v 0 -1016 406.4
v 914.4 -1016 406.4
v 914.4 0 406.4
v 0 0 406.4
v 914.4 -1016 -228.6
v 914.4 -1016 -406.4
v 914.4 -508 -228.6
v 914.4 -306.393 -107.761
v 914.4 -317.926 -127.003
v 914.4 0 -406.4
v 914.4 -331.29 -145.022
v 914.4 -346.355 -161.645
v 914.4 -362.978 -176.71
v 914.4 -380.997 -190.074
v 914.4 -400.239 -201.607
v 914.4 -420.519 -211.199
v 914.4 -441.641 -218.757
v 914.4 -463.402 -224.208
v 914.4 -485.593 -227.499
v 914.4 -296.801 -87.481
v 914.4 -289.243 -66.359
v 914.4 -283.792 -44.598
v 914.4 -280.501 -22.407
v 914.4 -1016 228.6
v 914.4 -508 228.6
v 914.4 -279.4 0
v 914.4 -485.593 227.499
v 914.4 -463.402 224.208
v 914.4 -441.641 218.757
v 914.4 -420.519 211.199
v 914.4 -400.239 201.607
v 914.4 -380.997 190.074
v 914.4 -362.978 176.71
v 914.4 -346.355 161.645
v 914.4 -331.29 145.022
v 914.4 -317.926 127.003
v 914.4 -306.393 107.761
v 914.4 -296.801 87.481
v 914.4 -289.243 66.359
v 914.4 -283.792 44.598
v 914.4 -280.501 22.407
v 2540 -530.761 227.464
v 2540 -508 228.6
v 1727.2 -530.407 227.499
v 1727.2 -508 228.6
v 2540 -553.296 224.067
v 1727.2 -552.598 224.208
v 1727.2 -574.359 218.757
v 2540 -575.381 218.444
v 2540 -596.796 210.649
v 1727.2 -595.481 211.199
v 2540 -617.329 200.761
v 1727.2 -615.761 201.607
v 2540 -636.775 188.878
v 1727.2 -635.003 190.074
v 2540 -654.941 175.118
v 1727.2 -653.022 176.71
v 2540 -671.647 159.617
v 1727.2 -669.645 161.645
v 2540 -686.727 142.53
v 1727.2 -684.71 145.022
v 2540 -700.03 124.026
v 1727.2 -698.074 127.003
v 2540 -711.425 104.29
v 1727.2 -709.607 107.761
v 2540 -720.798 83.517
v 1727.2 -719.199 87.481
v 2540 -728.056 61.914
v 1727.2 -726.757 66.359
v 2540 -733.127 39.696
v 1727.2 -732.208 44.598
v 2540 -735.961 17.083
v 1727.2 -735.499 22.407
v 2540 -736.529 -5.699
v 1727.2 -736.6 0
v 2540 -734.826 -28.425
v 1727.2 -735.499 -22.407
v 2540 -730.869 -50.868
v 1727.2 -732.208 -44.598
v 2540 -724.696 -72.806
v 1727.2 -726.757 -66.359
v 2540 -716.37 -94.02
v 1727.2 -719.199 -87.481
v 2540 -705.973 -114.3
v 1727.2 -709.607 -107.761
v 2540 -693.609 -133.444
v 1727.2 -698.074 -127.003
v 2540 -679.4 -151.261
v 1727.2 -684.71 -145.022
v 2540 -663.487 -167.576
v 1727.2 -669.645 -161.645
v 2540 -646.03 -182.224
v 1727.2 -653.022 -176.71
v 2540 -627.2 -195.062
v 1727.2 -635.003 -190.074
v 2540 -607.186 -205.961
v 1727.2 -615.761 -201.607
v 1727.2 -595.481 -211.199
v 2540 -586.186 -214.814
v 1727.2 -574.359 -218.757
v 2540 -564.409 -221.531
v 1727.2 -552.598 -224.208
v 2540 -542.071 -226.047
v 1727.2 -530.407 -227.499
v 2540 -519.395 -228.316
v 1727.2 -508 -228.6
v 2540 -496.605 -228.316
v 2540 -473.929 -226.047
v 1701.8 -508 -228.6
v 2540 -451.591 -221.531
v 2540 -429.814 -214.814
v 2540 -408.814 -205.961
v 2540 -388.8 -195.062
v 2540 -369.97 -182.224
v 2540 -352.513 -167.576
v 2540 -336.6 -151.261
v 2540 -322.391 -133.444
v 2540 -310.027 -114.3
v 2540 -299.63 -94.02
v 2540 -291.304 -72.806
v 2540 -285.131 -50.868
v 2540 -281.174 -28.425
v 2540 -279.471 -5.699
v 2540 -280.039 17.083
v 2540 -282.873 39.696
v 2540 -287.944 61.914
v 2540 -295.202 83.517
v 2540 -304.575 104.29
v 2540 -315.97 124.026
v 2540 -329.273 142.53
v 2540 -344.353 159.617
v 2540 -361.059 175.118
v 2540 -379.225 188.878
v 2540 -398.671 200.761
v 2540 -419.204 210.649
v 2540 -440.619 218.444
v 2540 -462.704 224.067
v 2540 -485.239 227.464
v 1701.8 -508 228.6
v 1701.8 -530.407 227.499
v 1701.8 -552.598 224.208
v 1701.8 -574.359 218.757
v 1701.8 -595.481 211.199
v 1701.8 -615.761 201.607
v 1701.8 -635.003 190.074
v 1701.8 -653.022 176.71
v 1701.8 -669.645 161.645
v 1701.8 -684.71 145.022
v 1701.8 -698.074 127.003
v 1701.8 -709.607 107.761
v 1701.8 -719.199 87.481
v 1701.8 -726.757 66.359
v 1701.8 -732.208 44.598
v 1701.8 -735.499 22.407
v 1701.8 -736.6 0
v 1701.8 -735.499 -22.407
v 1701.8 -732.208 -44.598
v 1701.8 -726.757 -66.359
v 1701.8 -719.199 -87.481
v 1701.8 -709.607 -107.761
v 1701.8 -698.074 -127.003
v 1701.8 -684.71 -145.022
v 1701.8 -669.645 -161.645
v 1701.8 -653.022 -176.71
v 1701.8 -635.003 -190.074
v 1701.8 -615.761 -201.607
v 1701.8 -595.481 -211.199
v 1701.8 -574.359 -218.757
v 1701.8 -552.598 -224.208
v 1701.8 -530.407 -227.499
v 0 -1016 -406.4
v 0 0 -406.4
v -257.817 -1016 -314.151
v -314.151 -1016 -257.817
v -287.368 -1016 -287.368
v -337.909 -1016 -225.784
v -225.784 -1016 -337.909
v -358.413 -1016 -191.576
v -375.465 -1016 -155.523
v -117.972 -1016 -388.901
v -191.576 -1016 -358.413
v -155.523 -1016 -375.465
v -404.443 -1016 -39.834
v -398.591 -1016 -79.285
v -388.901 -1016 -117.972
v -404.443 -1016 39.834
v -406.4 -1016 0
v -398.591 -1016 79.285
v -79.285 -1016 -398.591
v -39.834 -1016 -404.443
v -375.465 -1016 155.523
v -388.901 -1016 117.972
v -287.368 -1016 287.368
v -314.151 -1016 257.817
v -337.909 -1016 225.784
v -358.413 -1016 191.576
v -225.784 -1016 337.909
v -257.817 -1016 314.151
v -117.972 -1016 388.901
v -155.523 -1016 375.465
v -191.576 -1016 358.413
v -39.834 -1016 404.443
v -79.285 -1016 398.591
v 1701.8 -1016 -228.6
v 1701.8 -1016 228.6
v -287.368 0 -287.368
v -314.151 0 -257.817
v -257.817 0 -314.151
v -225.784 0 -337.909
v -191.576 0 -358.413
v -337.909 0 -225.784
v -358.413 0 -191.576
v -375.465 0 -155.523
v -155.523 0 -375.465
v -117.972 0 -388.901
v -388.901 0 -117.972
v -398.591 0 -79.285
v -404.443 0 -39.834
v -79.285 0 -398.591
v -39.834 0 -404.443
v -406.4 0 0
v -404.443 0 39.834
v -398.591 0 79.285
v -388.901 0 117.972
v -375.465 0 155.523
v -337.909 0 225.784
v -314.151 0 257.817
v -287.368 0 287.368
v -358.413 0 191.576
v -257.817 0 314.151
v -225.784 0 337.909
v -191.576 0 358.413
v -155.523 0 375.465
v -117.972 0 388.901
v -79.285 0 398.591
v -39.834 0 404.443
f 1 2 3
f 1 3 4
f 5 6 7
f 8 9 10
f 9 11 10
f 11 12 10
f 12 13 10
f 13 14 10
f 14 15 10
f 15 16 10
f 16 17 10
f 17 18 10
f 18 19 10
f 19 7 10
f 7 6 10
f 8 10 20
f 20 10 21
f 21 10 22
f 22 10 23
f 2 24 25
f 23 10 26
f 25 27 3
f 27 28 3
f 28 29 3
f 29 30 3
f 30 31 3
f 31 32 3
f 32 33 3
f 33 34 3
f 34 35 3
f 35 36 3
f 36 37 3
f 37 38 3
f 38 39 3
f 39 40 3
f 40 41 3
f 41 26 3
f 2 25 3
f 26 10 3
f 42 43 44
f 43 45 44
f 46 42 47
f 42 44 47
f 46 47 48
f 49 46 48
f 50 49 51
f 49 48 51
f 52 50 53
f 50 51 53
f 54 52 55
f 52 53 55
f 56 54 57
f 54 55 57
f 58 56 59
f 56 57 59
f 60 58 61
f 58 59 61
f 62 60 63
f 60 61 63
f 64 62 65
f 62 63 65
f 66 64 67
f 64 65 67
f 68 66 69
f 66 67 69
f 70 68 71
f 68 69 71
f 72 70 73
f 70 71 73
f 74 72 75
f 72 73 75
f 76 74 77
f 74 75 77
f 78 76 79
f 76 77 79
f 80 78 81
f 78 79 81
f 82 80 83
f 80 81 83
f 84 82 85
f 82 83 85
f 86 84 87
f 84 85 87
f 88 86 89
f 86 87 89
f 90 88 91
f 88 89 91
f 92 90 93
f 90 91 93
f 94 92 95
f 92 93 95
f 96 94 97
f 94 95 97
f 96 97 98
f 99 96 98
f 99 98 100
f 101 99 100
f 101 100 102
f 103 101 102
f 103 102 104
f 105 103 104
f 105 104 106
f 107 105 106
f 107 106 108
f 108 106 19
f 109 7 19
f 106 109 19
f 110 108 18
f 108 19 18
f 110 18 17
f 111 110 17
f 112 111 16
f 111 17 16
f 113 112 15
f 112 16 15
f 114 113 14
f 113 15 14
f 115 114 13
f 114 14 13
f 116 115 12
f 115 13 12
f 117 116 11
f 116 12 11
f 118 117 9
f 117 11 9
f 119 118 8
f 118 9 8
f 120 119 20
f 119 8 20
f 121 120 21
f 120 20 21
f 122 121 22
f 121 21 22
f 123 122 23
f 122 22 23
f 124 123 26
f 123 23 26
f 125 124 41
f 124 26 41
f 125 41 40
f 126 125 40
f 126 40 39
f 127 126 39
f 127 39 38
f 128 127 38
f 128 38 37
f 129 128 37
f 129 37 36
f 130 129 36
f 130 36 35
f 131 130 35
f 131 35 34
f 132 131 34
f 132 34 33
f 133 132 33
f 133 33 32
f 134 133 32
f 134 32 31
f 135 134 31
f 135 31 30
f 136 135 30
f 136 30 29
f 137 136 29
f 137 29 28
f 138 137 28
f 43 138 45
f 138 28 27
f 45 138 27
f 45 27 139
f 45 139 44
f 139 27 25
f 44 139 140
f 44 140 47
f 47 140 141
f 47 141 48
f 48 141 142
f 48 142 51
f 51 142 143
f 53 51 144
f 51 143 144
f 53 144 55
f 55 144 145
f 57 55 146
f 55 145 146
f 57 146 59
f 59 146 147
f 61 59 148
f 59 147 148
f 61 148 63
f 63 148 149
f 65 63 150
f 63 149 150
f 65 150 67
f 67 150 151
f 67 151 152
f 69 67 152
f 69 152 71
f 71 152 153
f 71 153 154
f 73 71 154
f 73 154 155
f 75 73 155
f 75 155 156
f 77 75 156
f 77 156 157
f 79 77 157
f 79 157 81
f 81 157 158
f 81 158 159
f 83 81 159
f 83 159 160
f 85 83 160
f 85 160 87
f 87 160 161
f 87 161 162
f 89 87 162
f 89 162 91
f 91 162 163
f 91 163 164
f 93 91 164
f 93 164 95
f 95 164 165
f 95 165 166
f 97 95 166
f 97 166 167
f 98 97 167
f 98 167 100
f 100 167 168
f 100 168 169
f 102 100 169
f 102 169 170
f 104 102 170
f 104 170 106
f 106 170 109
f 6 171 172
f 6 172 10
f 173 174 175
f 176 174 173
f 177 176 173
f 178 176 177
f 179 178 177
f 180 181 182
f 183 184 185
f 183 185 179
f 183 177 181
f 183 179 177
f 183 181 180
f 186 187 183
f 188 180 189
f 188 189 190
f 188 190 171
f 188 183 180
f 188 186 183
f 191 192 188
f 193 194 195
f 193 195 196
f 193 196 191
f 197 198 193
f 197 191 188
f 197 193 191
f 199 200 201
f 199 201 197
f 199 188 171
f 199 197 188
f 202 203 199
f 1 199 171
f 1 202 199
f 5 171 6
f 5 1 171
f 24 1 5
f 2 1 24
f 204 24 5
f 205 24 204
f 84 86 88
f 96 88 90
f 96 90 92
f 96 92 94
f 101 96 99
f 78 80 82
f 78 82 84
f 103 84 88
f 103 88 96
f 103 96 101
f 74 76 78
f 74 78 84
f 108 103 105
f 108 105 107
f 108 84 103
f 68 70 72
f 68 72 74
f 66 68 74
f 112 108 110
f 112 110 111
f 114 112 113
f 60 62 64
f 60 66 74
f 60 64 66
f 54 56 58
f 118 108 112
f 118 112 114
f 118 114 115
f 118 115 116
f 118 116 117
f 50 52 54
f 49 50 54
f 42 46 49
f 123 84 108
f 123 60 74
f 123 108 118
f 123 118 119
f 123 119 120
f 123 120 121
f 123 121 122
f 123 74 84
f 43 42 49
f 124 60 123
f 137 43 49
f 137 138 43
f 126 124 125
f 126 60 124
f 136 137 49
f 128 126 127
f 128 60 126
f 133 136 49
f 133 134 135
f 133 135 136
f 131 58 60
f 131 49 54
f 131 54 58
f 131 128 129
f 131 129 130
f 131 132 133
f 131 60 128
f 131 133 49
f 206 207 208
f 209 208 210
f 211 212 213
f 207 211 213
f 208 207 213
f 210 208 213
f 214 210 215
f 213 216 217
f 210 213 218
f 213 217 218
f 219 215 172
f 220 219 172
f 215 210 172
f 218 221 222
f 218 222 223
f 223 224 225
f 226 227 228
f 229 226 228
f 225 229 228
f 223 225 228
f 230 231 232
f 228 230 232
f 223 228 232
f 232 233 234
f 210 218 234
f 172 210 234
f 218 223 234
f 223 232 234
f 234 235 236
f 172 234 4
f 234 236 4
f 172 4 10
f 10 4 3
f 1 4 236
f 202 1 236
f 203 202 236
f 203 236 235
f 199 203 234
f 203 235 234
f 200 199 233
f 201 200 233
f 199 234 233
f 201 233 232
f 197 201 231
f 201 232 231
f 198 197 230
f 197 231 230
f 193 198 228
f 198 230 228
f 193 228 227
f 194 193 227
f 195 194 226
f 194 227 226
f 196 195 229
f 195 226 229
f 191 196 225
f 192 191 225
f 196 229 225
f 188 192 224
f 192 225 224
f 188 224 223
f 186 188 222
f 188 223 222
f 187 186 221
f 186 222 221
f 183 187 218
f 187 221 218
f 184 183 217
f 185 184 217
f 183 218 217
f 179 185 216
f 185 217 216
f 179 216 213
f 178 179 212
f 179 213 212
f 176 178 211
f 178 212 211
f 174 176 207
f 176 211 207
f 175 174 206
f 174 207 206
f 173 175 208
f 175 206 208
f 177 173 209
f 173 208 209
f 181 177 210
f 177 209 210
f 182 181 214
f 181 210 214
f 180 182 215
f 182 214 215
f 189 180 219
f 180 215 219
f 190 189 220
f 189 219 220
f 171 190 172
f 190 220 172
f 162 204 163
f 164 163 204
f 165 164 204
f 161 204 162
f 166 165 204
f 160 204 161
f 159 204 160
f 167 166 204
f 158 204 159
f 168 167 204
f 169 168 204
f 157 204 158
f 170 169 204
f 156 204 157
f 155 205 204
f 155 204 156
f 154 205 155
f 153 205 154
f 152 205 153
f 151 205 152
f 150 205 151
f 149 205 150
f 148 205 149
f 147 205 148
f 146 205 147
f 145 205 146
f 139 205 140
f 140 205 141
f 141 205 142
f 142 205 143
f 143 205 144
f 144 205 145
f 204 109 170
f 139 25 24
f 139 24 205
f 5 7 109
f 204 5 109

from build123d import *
from build123d import SkipClean  # not in build123d's __all__

# Parameters (mm, degrees)
F0_W     = 812.8
F0_H     = 457.2
F1_DEPTH = 1016
F3_DEPTH = 812.8
F4_DEPTH = 812.8
F5_DEPTH = 25.4


# Not quite as in the source:
# - a feature names something its author has since deleted; it is built from what else it names


with BuildPart() as f1:
    # F0 (on Front) → F1 (new body)
    with BuildSketch(Plane.XZ):
        with BuildLine():
            ThreePointArc((0, -406.4), (287.3681958742, -287.3681958742), (406.4, 0))
            ThreePointArc((406.4, 0), (287.3681958742, 287.3681958742), (0, 406.4))
            Line((0, 406.4), (0, -406.4))
        make_face()
        with BuildLine():
            ThreePointArc((0, 406.4), (287.3681958742, 287.3681958742), (406.4, 0))
            ThreePointArc((406.4, 0), (287.3681958742, -287.3681958742), (0, -406.4))
            Line((0, -406.4), (914.4, -406.4))
            Line((914.4, -406.4), (914.4, -228.6))
            Line((914.4, -228.6), (914.4, 228.6))
            Line((914.4, 228.6), (914.4, 406.4))
            Line((914.4, 406.4), (0, 406.4))
        make_face()
        with BuildLine():
            Line((0, -406.4), (0, 406.4))
            ThreePointArc((0, 406.4), (-406.4, 0), (0, -406.4))
        make_face()
        with Locations((1320.8, 0)):
            Rectangle(F0_W, F0_H)
    extrude(amount=F1_DEPTH)

    # F2 (on face) → F3 (cut)
    with BuildSketch(Plane.YZ.offset(1727.2)):
        with BuildLine():
            ThreePointArc((-508, 228.6), (-346.3553898207, 161.6446101792), (-279.4, 0))
            ThreePointArc((-279.4, 0), (-346.3553898207, -161.6446101792), (-508, -228.6))
            Line((-508, -228.6), (0, -228.6))
            Line((0, -228.6), (0, 228.6))
            Line((0, 228.6), (-508, 228.6))
        make_face()
    extrude(amount=-F3_DEPTH, mode=Mode.SUBTRACT)

    # F2 (on face) → F4 (join)
    with BuildSketch(Plane.YZ.offset(1727.2)):
        with BuildLine():
            ThreePointArc((-508, -228.6), (-346.3553898207, -161.6446101792), (-279.4, 0))
            ThreePointArc((-279.4, 0), (-346.3553898207, 161.6446101792), (-508, 228.6))
            ThreePointArc((-508, 228.6), (-736.6, 0), (-508, -228.6))
        make_face()
    with SkipClean():  # cleaning this boolean's faces spoils the solid; the shape is the same uncleaned
        extrude(amount=F4_DEPTH)

    # F2 (on face) → F5 (cut)
    with BuildSketch(Plane.YZ.offset(1727.2)):
        with BuildLine():
            ThreePointArc((-508, -228.6), (-736.6, 0), (-508, 228.6))
            Line((-508, 228.6), (-1016, 228.6))
            Line((-1016, 228.6), (-1016, -228.6))
            Line((-1016, -228.6), (-508, -228.6))
        make_face()
    extrude(amount=-F5_DEPTH, mode=Mode.SUBTRACT)


solid = f1.part
